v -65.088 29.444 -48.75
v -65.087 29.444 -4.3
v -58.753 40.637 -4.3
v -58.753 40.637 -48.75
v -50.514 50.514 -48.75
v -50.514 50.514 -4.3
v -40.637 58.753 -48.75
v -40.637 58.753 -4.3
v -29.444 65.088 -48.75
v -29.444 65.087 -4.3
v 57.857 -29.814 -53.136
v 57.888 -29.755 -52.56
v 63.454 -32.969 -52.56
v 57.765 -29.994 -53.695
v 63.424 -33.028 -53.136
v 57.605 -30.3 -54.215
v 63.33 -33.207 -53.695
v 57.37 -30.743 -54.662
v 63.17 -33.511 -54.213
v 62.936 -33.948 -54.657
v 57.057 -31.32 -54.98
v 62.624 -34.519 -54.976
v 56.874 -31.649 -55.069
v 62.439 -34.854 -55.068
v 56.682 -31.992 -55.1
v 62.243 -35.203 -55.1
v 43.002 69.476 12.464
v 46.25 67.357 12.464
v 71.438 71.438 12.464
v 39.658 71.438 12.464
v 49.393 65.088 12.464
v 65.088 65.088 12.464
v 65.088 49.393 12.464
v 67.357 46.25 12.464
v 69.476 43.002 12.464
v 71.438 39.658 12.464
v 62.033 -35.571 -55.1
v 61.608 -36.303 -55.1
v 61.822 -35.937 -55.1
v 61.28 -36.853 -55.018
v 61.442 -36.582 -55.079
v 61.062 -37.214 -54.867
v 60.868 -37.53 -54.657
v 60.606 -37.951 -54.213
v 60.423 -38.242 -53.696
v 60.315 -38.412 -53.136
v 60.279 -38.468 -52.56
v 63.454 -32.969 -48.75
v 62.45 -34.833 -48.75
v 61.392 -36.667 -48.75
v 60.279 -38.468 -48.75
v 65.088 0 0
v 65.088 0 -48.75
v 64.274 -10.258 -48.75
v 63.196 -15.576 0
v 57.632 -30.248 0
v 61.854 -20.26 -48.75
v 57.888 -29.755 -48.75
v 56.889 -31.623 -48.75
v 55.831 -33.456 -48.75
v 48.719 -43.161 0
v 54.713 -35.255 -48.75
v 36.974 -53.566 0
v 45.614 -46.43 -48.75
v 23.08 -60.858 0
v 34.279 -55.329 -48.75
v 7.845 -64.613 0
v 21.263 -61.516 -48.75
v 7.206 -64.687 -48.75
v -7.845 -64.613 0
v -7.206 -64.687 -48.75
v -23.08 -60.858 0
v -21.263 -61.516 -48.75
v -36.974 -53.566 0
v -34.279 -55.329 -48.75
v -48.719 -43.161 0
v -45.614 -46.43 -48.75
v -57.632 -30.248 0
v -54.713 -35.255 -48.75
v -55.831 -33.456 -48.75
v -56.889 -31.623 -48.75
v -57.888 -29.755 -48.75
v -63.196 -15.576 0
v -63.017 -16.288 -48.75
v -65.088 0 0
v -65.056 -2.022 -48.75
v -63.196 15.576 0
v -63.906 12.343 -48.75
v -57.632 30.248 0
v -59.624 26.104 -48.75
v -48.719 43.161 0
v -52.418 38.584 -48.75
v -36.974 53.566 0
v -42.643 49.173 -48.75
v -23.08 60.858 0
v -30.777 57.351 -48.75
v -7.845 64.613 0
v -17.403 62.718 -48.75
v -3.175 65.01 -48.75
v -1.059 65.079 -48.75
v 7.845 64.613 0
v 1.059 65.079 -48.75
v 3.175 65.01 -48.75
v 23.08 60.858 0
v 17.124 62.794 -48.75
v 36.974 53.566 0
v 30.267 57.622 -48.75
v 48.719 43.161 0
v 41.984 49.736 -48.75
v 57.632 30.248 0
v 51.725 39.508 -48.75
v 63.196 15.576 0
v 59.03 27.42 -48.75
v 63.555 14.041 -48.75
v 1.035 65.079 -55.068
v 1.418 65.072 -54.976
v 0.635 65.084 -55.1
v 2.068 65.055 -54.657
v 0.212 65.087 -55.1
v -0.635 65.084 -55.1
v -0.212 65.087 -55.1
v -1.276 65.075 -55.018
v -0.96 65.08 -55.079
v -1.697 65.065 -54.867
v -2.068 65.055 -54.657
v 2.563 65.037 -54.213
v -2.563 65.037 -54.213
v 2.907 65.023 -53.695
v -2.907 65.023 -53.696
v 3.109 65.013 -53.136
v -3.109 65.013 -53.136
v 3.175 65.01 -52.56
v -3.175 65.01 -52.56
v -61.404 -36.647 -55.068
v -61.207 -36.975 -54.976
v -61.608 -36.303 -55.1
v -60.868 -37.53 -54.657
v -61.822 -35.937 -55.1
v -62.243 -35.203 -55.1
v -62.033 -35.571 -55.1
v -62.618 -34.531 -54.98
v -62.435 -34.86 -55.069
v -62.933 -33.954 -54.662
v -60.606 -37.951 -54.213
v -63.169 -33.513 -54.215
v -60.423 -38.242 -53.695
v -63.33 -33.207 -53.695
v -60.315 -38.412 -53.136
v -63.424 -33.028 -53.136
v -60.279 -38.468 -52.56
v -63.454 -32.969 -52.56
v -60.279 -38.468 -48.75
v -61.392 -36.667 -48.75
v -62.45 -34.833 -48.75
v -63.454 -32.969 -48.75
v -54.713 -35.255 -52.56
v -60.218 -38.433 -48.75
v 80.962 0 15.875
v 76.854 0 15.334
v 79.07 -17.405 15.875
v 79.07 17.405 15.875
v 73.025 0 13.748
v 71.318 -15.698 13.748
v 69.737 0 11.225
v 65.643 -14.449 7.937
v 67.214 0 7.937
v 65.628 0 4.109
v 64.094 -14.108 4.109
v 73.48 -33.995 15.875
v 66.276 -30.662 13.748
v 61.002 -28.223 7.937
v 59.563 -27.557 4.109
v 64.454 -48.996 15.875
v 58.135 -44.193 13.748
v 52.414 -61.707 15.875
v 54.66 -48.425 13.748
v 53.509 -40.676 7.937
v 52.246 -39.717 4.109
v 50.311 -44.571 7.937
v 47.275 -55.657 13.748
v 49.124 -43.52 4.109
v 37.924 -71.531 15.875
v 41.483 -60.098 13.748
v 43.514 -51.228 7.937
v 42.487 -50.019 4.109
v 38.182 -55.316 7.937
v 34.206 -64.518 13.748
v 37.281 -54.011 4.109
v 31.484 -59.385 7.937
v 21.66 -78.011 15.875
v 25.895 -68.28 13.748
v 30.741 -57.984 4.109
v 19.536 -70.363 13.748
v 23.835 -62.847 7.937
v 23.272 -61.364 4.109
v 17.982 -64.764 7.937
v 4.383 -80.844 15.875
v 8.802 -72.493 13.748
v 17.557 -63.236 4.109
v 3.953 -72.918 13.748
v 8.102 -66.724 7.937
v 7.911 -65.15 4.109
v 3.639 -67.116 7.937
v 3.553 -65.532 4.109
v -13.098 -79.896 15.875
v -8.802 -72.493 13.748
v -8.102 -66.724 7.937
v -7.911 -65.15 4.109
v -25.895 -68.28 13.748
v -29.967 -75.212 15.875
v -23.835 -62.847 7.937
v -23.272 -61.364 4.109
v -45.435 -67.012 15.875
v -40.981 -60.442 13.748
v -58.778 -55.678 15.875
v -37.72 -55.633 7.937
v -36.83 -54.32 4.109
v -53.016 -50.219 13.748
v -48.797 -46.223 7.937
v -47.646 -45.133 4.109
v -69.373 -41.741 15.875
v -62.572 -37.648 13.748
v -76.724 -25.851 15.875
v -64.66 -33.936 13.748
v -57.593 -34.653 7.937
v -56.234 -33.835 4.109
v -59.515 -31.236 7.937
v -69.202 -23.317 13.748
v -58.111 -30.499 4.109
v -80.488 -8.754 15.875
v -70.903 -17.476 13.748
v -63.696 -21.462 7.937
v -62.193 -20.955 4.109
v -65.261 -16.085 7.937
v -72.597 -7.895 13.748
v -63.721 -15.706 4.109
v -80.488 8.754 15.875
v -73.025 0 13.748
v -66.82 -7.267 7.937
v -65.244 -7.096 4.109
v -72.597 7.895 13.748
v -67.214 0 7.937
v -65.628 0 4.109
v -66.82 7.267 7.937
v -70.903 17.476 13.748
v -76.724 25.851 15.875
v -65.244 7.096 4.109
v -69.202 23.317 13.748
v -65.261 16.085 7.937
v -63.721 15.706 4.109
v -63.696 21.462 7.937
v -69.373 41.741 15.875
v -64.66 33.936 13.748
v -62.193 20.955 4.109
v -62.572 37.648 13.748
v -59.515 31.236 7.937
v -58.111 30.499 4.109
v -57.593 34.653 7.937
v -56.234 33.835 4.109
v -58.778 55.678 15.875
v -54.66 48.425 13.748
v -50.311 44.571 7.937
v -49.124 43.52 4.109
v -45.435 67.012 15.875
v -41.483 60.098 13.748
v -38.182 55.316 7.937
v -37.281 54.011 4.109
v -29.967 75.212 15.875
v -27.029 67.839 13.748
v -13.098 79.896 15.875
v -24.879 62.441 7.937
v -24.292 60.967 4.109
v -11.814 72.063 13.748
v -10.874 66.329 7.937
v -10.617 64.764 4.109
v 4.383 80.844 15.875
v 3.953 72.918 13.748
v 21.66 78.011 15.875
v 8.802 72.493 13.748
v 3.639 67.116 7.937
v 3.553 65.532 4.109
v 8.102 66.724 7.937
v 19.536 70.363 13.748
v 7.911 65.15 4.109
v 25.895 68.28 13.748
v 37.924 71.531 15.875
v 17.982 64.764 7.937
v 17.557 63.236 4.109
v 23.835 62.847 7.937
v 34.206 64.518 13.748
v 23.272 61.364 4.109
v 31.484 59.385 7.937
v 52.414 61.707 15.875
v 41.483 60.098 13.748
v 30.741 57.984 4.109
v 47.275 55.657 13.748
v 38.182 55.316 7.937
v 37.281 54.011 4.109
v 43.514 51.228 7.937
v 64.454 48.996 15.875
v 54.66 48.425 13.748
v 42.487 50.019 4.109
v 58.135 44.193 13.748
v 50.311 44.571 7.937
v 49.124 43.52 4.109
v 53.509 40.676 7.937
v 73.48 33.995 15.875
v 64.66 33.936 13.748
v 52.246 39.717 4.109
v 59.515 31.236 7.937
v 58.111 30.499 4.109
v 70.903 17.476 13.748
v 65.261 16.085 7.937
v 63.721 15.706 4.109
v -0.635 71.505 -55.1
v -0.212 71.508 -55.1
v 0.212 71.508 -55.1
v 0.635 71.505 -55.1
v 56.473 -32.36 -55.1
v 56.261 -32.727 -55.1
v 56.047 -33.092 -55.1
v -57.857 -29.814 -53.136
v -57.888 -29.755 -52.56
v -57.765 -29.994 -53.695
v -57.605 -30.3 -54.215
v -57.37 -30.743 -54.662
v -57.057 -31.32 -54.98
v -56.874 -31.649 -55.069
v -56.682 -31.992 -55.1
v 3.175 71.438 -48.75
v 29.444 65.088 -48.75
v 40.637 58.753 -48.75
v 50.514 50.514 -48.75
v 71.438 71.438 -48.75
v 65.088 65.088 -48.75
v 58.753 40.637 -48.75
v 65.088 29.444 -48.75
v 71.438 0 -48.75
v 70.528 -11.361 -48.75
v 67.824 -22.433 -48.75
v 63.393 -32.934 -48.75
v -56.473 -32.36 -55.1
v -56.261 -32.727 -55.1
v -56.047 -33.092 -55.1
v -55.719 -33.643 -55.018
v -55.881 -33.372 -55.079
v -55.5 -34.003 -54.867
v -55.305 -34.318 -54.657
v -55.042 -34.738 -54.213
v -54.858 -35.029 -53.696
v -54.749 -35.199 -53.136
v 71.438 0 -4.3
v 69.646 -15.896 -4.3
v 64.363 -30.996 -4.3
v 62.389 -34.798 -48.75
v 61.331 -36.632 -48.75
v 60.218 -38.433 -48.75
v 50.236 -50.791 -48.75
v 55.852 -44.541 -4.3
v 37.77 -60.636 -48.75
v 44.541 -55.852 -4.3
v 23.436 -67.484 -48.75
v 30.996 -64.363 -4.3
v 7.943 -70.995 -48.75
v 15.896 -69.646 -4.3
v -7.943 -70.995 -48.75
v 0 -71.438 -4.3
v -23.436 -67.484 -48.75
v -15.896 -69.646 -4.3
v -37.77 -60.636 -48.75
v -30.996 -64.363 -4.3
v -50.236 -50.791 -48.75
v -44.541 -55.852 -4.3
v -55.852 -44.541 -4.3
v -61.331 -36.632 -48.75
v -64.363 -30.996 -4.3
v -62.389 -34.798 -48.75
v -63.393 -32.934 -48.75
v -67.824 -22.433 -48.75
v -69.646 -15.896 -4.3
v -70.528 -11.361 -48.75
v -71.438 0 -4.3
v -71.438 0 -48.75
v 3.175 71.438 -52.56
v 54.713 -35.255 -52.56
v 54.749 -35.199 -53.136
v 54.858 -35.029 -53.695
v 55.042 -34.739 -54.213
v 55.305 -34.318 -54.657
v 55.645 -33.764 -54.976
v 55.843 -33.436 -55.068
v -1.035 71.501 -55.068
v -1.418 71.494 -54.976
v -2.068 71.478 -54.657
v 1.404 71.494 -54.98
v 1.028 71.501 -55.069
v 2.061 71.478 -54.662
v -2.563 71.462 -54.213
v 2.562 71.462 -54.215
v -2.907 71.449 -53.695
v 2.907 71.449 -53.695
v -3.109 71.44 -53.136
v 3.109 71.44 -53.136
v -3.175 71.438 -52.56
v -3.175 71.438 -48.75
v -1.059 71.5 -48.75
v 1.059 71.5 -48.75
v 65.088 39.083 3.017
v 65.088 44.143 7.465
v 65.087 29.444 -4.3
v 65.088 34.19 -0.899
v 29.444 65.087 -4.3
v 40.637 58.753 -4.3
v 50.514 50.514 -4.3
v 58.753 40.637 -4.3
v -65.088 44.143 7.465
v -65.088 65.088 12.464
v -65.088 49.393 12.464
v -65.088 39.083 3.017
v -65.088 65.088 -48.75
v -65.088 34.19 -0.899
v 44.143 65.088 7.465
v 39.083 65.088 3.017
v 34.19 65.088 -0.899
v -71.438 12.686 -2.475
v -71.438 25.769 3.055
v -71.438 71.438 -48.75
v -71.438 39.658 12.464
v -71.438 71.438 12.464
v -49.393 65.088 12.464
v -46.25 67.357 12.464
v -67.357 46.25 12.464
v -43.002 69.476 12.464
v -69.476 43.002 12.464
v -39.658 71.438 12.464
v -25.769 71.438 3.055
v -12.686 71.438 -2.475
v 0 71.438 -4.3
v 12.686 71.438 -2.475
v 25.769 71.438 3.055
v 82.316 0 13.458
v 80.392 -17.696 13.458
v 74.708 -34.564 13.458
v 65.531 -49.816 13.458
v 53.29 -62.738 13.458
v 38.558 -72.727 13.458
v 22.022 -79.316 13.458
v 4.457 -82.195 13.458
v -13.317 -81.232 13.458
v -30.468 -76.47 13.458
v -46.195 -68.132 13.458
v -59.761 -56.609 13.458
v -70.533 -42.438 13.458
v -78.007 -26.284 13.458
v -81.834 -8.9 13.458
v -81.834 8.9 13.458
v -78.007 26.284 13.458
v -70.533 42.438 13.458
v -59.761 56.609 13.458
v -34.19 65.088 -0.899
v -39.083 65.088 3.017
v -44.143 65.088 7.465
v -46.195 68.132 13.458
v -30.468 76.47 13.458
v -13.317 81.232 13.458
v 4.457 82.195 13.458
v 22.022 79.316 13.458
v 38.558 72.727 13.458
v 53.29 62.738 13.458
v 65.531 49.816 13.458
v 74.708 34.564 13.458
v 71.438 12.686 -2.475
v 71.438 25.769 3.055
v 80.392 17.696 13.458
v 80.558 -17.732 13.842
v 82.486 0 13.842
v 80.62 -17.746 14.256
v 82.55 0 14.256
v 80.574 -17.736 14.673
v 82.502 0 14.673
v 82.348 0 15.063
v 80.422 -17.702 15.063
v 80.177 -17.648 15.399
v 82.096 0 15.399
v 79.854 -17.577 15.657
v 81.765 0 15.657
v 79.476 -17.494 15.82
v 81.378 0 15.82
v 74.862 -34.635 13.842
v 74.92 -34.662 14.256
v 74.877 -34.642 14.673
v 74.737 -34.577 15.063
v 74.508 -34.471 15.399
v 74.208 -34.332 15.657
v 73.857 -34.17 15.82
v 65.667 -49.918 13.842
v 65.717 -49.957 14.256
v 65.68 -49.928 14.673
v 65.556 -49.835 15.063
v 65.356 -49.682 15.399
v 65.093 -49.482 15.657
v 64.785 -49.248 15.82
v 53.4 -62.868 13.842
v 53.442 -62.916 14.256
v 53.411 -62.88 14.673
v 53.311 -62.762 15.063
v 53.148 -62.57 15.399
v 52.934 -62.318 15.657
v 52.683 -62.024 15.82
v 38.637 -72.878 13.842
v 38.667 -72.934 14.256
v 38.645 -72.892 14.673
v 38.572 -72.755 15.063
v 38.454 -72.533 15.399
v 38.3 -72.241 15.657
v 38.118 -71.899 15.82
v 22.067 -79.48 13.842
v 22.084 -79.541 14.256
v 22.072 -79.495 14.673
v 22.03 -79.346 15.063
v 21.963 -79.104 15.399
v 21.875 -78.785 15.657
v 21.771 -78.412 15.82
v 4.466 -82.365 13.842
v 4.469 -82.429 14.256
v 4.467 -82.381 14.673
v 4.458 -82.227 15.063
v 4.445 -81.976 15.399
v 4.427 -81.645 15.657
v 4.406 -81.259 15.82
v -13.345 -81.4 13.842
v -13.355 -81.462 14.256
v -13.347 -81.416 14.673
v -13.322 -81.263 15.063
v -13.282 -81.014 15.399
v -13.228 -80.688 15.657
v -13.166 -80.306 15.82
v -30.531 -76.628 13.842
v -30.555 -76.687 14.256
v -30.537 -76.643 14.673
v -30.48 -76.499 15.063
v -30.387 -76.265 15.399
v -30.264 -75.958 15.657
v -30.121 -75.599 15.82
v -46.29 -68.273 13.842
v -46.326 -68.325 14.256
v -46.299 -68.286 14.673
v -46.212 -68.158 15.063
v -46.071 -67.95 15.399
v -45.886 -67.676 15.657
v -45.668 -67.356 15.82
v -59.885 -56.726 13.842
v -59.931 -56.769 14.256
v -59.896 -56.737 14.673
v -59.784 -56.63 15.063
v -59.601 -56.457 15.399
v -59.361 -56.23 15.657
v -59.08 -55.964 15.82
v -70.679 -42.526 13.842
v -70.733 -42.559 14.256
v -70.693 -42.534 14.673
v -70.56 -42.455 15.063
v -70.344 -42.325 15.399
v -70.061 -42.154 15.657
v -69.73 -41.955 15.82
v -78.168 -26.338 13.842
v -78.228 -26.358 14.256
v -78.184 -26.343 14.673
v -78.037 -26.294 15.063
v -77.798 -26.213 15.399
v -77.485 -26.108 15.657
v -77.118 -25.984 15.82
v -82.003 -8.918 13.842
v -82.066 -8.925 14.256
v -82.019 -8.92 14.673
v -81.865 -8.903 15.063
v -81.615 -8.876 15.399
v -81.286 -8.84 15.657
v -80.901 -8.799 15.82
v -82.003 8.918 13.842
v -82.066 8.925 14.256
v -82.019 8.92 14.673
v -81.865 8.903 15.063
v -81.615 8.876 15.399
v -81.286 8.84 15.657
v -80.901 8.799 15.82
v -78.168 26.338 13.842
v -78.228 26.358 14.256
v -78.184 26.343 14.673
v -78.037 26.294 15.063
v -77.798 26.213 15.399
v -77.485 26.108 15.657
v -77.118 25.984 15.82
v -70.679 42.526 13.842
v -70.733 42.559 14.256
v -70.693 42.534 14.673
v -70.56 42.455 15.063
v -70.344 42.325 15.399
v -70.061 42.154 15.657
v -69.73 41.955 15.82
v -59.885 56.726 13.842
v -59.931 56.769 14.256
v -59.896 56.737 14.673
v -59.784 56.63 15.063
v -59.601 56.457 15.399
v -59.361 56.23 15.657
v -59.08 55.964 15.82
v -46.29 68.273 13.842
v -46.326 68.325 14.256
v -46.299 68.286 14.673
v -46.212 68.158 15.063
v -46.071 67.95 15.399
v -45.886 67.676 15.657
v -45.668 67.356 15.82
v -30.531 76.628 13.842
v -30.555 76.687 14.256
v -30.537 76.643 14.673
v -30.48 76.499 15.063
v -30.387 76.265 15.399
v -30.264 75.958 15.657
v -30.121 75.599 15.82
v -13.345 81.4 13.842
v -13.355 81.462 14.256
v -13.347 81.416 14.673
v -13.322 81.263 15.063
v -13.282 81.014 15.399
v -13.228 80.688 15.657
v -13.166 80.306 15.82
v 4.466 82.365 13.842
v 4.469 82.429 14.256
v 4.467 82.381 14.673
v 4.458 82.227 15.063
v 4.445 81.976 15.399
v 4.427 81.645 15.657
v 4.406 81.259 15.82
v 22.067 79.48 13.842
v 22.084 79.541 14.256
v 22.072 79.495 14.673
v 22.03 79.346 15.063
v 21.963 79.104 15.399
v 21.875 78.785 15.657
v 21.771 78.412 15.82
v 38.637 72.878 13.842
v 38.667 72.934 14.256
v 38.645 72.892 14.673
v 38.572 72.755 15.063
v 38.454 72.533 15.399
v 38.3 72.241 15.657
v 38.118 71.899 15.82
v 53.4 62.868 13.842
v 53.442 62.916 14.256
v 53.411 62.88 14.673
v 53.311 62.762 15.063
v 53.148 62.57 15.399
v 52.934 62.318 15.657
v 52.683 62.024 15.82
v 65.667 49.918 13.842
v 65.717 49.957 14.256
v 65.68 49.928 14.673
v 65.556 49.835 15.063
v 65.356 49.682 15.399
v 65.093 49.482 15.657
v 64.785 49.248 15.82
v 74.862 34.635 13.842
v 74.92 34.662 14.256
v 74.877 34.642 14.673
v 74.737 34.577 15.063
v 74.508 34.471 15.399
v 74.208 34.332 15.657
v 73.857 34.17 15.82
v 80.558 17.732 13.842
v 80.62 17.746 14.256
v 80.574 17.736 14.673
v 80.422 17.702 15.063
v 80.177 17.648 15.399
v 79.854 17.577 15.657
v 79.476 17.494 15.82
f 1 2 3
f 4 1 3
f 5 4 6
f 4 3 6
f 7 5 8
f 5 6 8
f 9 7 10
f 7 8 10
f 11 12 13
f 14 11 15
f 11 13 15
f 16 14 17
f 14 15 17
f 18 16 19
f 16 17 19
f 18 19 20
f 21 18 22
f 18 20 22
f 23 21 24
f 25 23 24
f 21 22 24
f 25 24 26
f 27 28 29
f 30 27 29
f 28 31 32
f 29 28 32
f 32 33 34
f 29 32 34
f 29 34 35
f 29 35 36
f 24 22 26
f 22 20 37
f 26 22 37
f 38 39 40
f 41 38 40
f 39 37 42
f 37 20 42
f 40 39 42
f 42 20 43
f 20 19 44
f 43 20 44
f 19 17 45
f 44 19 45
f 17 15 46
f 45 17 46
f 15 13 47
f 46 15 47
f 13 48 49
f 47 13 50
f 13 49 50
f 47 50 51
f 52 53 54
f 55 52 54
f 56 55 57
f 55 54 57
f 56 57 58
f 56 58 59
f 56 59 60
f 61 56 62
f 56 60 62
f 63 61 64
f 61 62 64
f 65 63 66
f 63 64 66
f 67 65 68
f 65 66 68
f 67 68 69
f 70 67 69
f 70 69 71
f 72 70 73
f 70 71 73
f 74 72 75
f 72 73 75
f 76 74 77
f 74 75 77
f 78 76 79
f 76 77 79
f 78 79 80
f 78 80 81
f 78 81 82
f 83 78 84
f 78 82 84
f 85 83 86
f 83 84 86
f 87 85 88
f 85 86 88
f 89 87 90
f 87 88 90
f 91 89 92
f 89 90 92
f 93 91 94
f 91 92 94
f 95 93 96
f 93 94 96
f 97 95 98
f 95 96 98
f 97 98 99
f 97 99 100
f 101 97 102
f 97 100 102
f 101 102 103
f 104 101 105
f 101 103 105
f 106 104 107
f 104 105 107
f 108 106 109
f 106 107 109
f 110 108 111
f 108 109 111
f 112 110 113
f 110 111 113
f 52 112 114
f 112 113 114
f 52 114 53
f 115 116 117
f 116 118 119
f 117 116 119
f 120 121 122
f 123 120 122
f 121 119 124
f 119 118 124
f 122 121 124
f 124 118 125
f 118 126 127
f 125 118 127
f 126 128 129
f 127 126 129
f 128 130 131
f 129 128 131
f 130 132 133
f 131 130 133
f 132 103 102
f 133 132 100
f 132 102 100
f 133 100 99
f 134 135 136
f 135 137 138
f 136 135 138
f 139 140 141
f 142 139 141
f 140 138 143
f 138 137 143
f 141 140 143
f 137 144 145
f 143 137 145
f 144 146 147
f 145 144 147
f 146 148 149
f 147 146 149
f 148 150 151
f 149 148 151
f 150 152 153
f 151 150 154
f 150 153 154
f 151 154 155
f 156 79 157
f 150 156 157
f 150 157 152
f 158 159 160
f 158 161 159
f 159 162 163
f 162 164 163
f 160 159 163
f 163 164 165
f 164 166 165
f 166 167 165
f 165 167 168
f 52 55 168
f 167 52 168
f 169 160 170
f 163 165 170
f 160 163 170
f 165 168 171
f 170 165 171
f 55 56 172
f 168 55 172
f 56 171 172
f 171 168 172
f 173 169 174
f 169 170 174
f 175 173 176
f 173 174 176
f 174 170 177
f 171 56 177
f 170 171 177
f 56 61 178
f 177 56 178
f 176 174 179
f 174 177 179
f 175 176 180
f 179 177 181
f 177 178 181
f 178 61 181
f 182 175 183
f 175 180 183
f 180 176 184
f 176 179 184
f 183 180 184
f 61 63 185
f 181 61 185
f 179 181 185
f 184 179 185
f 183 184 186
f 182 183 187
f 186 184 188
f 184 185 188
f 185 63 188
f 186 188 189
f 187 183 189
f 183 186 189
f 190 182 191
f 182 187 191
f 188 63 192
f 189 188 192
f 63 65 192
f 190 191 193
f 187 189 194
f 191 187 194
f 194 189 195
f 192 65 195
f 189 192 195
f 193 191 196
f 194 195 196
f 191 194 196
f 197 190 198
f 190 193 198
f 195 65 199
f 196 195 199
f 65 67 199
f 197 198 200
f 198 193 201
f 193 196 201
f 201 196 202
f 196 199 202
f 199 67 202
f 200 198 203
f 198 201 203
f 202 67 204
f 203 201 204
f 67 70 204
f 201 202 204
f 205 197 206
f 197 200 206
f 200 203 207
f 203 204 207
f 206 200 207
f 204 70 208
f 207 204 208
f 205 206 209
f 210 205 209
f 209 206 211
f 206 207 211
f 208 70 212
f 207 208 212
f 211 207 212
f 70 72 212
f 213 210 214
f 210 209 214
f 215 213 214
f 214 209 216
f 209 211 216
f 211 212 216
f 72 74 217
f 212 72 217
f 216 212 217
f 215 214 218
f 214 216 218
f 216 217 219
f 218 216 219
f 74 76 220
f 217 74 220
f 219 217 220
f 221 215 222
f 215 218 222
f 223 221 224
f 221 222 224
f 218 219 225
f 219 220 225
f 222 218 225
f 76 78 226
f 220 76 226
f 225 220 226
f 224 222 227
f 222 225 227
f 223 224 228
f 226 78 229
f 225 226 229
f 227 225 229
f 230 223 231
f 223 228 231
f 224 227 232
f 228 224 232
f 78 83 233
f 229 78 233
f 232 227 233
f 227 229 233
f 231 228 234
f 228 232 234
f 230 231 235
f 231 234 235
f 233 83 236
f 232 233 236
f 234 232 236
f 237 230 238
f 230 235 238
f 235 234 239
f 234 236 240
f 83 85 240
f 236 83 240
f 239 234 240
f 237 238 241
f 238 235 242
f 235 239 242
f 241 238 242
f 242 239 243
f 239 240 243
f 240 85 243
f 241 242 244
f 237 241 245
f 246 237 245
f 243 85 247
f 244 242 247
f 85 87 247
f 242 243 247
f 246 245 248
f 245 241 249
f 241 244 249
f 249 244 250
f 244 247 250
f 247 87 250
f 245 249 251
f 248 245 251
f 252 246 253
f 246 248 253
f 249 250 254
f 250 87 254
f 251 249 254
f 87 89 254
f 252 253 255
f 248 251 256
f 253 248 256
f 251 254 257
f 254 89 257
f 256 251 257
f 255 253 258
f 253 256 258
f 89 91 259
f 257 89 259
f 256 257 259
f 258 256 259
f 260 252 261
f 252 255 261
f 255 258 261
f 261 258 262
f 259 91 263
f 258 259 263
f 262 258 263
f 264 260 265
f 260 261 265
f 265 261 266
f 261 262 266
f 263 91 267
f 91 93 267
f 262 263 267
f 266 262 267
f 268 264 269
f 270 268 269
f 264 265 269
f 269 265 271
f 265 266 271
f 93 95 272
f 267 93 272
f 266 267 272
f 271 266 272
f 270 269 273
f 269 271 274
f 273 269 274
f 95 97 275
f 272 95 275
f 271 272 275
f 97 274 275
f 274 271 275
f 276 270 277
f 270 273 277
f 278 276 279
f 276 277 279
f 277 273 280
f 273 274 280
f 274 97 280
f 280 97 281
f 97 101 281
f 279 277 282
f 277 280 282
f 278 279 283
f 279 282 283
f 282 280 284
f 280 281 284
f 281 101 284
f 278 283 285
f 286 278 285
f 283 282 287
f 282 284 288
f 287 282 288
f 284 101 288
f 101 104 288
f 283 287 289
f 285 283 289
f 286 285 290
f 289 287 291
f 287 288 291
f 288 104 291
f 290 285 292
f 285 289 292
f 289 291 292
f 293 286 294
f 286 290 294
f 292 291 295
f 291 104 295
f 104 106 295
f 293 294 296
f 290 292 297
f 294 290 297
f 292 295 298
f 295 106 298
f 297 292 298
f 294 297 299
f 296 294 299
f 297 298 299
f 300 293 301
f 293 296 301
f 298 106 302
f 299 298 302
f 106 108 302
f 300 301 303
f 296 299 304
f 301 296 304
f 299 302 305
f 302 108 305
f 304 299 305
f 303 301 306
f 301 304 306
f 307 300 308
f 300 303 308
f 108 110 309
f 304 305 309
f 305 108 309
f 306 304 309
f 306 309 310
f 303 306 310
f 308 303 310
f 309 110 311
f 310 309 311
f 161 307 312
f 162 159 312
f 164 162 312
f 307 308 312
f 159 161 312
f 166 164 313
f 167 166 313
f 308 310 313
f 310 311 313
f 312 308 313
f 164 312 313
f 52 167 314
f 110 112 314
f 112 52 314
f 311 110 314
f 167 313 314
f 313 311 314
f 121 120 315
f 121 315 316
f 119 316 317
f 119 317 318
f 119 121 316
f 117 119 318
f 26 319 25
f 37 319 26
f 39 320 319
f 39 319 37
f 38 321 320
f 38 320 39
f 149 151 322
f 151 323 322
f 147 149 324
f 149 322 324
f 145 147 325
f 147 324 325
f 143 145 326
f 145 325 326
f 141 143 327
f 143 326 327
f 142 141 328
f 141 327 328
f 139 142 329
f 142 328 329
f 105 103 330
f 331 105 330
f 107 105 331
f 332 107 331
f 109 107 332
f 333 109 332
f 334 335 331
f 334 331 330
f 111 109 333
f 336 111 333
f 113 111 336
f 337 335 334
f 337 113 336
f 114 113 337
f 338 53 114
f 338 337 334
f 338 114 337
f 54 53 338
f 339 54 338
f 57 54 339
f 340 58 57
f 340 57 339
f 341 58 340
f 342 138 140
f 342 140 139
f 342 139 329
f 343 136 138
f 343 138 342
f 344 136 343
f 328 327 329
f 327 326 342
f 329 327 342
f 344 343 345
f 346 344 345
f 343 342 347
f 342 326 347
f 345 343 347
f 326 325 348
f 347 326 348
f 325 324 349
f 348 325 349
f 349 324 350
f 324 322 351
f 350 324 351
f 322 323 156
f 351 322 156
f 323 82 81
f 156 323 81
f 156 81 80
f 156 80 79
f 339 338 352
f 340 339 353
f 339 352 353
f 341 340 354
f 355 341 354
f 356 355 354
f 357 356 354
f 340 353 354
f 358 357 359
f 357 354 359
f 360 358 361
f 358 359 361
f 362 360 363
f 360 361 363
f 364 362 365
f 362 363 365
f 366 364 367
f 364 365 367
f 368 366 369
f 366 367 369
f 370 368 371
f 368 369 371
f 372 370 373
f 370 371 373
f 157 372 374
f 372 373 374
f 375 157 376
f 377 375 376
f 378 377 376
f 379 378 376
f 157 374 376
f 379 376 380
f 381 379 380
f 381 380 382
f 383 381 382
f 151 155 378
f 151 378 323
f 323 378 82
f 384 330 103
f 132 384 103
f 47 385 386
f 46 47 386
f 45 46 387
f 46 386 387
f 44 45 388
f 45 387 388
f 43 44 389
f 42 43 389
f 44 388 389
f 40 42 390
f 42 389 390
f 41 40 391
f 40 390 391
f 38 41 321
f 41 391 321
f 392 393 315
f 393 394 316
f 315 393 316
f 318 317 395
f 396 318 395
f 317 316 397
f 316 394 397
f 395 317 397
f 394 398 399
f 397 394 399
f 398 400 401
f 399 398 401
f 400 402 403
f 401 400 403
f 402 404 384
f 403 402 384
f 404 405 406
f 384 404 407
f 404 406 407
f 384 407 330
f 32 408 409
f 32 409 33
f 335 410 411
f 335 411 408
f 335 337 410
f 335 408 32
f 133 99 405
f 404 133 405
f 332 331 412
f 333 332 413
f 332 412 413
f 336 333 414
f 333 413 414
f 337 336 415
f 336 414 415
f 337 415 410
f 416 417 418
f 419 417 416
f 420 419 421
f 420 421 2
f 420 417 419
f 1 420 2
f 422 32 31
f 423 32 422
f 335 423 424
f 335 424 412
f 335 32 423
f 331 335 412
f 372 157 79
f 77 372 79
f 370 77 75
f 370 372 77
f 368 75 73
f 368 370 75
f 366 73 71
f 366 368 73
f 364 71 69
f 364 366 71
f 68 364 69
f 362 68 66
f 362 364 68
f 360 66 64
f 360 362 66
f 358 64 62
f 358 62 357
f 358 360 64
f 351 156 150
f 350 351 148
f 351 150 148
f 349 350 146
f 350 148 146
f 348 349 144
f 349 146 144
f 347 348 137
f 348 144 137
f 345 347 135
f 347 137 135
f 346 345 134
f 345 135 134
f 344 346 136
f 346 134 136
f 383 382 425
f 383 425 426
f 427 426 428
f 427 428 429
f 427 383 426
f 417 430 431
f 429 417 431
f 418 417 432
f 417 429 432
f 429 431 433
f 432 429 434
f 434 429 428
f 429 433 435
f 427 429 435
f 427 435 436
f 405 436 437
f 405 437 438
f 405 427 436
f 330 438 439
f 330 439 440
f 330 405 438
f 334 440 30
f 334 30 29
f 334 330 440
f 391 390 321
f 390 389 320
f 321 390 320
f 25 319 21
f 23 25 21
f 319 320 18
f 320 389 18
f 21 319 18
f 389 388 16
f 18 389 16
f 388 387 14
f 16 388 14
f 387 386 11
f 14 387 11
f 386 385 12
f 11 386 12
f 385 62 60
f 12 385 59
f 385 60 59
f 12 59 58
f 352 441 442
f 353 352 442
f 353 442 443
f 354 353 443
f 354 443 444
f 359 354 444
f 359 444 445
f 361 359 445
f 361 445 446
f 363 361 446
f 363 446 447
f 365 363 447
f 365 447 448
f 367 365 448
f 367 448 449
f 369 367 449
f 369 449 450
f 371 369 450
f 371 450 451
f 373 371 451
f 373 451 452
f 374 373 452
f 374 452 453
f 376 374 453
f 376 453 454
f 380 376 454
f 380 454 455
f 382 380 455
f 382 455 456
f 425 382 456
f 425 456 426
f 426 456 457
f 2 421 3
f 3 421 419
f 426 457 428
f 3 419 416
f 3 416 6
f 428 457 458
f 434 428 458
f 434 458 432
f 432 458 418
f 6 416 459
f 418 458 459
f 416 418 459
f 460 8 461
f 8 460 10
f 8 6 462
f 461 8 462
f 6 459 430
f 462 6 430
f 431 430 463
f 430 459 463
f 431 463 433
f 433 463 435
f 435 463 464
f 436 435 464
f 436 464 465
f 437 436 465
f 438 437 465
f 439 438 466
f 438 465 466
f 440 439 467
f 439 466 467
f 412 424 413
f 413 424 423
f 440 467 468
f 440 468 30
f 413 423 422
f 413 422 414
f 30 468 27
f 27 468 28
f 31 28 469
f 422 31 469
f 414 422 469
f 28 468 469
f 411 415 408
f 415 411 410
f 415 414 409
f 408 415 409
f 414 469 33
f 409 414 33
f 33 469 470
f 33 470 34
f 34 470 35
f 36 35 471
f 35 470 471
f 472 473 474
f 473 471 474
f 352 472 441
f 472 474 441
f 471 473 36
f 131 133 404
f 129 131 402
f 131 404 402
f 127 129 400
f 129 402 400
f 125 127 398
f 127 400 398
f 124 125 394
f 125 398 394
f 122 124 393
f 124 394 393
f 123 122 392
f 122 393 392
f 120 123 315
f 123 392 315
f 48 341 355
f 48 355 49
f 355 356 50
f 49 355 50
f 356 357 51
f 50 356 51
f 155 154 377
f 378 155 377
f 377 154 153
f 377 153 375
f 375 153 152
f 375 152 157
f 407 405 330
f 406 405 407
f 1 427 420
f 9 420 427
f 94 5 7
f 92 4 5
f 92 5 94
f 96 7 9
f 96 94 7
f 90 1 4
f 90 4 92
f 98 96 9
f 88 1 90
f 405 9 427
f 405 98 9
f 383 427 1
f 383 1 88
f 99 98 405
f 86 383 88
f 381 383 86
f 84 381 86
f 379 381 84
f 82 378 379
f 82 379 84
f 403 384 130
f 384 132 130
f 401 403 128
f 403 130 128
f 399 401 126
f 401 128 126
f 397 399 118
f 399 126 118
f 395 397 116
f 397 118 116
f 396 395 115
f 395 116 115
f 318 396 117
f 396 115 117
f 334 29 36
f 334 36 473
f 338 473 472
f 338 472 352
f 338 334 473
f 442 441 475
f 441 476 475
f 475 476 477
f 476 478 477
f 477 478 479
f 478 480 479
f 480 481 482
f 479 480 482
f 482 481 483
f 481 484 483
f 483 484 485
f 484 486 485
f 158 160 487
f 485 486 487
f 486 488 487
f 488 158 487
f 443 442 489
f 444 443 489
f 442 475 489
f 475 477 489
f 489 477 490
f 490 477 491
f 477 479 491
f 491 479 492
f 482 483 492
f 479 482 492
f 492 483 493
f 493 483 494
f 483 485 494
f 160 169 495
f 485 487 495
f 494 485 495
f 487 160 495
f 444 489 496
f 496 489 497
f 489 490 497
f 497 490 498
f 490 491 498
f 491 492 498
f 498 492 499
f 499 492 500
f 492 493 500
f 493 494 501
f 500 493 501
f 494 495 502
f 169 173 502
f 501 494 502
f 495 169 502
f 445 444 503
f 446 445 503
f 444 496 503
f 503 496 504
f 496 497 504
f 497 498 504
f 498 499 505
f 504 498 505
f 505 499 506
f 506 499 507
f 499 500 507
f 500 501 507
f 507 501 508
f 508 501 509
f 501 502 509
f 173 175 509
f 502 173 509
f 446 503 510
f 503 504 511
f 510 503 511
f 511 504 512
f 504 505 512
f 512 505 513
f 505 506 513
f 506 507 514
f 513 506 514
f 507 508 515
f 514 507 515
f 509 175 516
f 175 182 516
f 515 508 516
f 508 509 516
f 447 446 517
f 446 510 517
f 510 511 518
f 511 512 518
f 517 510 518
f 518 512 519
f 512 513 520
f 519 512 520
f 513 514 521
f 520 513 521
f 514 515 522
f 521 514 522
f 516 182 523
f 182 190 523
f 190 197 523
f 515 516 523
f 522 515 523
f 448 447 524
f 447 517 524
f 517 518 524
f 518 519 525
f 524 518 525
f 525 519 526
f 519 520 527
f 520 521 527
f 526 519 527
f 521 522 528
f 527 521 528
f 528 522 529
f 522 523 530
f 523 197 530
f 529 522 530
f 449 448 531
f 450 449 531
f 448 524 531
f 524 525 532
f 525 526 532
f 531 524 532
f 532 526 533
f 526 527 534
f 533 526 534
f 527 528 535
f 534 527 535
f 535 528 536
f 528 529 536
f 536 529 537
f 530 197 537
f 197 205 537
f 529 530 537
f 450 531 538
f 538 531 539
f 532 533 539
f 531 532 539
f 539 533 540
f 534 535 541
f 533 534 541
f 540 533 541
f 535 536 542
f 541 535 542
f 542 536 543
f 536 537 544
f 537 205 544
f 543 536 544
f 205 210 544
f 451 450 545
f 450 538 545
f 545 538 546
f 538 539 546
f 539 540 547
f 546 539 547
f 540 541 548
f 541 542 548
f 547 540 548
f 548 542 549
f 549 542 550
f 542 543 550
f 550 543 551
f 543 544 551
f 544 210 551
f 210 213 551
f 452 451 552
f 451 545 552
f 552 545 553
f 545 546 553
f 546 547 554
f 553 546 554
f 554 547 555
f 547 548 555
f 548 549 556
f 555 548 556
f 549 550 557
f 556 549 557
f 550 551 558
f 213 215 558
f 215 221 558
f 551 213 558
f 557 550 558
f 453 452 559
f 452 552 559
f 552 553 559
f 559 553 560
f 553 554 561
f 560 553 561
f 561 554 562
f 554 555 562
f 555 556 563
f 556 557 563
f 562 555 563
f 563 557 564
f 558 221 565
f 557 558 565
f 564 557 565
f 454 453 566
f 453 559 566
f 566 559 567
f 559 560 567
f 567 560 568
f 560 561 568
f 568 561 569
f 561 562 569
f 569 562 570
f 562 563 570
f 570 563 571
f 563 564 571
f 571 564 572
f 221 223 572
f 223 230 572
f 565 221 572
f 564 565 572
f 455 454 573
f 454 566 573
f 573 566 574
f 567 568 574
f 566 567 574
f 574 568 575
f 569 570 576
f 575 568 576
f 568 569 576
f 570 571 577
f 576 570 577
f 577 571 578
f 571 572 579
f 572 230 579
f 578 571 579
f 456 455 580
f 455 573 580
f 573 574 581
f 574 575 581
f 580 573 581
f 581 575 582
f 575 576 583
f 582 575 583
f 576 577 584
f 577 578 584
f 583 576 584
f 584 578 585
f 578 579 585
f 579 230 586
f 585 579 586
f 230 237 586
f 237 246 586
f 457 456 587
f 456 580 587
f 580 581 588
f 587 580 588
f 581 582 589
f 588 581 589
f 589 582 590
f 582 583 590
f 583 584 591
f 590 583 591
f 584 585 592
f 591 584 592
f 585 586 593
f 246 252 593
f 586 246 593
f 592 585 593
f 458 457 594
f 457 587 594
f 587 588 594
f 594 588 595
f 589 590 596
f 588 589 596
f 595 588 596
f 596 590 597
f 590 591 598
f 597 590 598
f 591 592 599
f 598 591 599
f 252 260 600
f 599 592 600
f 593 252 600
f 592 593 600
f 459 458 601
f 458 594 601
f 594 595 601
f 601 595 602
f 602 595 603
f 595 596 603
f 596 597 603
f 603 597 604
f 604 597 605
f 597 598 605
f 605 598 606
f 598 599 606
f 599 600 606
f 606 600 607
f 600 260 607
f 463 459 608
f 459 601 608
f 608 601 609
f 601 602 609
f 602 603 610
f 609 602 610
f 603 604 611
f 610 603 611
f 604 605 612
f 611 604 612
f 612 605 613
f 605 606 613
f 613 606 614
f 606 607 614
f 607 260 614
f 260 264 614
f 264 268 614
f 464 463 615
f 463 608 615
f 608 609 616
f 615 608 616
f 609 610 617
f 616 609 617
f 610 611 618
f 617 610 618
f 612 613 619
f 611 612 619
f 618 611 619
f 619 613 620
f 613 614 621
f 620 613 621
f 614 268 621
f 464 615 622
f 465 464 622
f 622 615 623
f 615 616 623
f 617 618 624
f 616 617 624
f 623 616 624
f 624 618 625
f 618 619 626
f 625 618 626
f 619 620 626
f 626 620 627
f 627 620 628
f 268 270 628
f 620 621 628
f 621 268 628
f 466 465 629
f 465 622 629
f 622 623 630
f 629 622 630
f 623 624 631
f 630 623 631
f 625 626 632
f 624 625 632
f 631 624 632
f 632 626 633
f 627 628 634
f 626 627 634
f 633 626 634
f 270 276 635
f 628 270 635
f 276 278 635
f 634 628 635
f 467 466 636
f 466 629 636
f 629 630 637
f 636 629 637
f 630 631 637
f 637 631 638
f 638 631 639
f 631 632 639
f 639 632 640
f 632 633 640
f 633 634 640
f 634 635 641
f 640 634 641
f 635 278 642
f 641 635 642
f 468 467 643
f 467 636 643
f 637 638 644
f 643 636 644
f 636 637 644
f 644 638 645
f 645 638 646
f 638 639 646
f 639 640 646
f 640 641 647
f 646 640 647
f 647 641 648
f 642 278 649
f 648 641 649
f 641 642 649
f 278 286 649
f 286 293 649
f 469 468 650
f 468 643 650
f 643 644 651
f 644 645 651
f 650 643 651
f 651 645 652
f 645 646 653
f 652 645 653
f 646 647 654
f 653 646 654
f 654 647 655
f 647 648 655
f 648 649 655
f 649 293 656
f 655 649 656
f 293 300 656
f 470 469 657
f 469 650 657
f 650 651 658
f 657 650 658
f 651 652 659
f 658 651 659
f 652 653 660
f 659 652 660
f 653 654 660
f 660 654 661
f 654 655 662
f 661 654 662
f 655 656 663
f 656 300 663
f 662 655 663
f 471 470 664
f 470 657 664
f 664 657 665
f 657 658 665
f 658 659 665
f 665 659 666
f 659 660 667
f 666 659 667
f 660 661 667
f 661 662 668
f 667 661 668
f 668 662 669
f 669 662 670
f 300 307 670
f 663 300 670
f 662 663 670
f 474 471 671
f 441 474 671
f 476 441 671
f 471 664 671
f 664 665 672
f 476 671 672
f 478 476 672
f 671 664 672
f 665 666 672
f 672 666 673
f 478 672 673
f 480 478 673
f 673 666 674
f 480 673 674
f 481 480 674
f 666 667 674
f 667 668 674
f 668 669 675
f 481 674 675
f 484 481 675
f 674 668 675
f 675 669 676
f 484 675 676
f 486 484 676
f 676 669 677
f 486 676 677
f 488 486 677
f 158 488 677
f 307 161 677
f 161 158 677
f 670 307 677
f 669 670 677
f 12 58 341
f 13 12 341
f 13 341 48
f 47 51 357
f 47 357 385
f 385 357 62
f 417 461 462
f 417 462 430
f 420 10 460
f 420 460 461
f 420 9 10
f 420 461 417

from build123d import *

# Parameters (mm, degrees)
F0_W     = 6.35
F0_H     = 6.35
F3_DEPTH = 61.214
F5_DEPTH = 6.35
F6_R     = 2.54


with BuildPart() as f1:
    # F0 (on Front) → F1 (revolve)
    with BuildSketch(Plane.XZ):
        with BuildLine():
            ThreePointArc((82.316182, 13.458223), (82.347533, 15.063283), (80.9625, 15.875))
            ThreePointArc((80.9625, 15.875), (69.73718, 11.22532), (65.0875, 0))
            Line((65.0875, 0), (71.4375, 8.40026))
            ThreePointArc((71.4375, 8.40026), (75.73724, 11.57526), (80.9625, 12.7))
            ThreePointArc((80.9625, 12.7), (81.738283, 12.902467), (82.316182, 13.458223))
        make_face()
        Polygon((71.4375, 8.40026), (65.0875, 0), (65.0875, -42.39974), (71.4375, -42.39974), (71.4375, -4.29974), align=None)
        with Locations((68.2625, -45.57474)):
            Rectangle(F0_W, F0_H)
        with BuildLine():
            Line((71.4375, -4.29974), (82.316182, 13.458223))
            ThreePointArc((82.316182, 13.458223), (81.738283, 12.902467), (80.9625, 12.7))
            ThreePointArc((80.9625, 12.7), (75.73724, 11.57526), (71.4375, 8.40026))
            Line((71.4375, 8.40026), (71.4375, -4.29974))
        make_face()
    revolve(axis=Axis((0, 0, -2.826434), (0, 0, -1)))

    # F2 (on face) → F3 (join)
    with BuildSketch(Plane(origin=(0, 0, -48.74974), x_dir=(1, 0, 0), z_dir=(0, 0, -1))):
        with BuildLine():
            ThreePointArc((-65.0875, -29.443739), (-69.831958, -15.060347), (-71.4375, 0))
            Line((-71.4375, 0), (-71.4375, -71.4375))
            Line((-71.4375, -71.4375), (0, -71.4375))
            ThreePointArc((0, -71.4375), (-15.060347, -69.831958), (-29.443739, -65.0875))
            Line((-29.443739, -65.0875), (-65.0875, -65.0875))
            Line((-65.0875, -65.0875), (-65.0875, -29.443739))
        make_face()
        with BuildLine():
            Line((71.4375, -71.4375), (71.4375, 0))
            ThreePointArc((71.4375, 0), (69.831958, -15.060347), (65.0875, -29.443739))
            Line((65.0875, -29.443739), (65.0875, -65.0875))
            Line((65.0875, -65.0875), (29.443739, -65.0875))
            ThreePointArc((29.443739, -65.0875), (15.060347, -69.831958), (0, -71.4375))
            Line((0, -71.4375), (71.4375, -71.4375))
        make_face()
    extrude(amount=-F3_DEPTH)

    # F4 (on face) → F5 (join)
    with BuildSketch(Plane(origin=(0, 0, -48.74974), x_dir=(1, 0, 0), z_dir=(0, 0, -1))):
        with BuildLine():
            ThreePointArc((3.175, -65.010015), (0, -65.0875), (-3.175, -65.010015))
            Line((-3.175, -65.010015), (-3.175, -71.4375))
            ThreePointArc((-3.175, -71.4375), (0, -71.508021), (3.175, -71.4375))
            Line((3.175, -71.4375), (3.175, -65.010015))
        make_face()
        with BuildLine():
            ThreePointArc((54.712824, 35.254638), (56.367428, 32.54375), (57.887824, 29.755377))
            Line((57.887824, 29.755377), (63.45419, 32.969119))
            ThreePointArc((63.45419, 32.969119), (61.927763, 35.75401), (60.27919, 38.468381))
            Line((60.27919, 38.468381), (54.712824, 35.254638))
        make_face()
        with BuildLine():
            ThreePointArc((-57.887824, 29.755377), (-56.367428, 32.54375), (-54.712824, 35.254638))
            Line((-54.712824, 35.254638), (-60.27919, 38.468381))
            ThreePointArc((-60.27919, 38.468381), (-61.927763, 35.75401), (-63.45419, 32.969119))
            Line((-63.45419, 32.969119), (-57.887824, 29.755377))
        make_face()
    extrude(amount=F5_DEPTH)

    # F6
    f6_edges = [f1.edges().sort_by_distance(p)[0] for p in [
        (57.496007, -36.861509, -55.09974),
        (60.671007, -31.362248, -55.09974),
        (-57.496007, -36.861509, -55.09974),
        (-60.671007, -31.362248, -55.09974),
        (3.175, 68.223757, -55.09974),
        (-3.175, 68.223757, -55.09974),
    ]]
    fillet(f6_edges, radius=F6_R)


solid = f1.part
